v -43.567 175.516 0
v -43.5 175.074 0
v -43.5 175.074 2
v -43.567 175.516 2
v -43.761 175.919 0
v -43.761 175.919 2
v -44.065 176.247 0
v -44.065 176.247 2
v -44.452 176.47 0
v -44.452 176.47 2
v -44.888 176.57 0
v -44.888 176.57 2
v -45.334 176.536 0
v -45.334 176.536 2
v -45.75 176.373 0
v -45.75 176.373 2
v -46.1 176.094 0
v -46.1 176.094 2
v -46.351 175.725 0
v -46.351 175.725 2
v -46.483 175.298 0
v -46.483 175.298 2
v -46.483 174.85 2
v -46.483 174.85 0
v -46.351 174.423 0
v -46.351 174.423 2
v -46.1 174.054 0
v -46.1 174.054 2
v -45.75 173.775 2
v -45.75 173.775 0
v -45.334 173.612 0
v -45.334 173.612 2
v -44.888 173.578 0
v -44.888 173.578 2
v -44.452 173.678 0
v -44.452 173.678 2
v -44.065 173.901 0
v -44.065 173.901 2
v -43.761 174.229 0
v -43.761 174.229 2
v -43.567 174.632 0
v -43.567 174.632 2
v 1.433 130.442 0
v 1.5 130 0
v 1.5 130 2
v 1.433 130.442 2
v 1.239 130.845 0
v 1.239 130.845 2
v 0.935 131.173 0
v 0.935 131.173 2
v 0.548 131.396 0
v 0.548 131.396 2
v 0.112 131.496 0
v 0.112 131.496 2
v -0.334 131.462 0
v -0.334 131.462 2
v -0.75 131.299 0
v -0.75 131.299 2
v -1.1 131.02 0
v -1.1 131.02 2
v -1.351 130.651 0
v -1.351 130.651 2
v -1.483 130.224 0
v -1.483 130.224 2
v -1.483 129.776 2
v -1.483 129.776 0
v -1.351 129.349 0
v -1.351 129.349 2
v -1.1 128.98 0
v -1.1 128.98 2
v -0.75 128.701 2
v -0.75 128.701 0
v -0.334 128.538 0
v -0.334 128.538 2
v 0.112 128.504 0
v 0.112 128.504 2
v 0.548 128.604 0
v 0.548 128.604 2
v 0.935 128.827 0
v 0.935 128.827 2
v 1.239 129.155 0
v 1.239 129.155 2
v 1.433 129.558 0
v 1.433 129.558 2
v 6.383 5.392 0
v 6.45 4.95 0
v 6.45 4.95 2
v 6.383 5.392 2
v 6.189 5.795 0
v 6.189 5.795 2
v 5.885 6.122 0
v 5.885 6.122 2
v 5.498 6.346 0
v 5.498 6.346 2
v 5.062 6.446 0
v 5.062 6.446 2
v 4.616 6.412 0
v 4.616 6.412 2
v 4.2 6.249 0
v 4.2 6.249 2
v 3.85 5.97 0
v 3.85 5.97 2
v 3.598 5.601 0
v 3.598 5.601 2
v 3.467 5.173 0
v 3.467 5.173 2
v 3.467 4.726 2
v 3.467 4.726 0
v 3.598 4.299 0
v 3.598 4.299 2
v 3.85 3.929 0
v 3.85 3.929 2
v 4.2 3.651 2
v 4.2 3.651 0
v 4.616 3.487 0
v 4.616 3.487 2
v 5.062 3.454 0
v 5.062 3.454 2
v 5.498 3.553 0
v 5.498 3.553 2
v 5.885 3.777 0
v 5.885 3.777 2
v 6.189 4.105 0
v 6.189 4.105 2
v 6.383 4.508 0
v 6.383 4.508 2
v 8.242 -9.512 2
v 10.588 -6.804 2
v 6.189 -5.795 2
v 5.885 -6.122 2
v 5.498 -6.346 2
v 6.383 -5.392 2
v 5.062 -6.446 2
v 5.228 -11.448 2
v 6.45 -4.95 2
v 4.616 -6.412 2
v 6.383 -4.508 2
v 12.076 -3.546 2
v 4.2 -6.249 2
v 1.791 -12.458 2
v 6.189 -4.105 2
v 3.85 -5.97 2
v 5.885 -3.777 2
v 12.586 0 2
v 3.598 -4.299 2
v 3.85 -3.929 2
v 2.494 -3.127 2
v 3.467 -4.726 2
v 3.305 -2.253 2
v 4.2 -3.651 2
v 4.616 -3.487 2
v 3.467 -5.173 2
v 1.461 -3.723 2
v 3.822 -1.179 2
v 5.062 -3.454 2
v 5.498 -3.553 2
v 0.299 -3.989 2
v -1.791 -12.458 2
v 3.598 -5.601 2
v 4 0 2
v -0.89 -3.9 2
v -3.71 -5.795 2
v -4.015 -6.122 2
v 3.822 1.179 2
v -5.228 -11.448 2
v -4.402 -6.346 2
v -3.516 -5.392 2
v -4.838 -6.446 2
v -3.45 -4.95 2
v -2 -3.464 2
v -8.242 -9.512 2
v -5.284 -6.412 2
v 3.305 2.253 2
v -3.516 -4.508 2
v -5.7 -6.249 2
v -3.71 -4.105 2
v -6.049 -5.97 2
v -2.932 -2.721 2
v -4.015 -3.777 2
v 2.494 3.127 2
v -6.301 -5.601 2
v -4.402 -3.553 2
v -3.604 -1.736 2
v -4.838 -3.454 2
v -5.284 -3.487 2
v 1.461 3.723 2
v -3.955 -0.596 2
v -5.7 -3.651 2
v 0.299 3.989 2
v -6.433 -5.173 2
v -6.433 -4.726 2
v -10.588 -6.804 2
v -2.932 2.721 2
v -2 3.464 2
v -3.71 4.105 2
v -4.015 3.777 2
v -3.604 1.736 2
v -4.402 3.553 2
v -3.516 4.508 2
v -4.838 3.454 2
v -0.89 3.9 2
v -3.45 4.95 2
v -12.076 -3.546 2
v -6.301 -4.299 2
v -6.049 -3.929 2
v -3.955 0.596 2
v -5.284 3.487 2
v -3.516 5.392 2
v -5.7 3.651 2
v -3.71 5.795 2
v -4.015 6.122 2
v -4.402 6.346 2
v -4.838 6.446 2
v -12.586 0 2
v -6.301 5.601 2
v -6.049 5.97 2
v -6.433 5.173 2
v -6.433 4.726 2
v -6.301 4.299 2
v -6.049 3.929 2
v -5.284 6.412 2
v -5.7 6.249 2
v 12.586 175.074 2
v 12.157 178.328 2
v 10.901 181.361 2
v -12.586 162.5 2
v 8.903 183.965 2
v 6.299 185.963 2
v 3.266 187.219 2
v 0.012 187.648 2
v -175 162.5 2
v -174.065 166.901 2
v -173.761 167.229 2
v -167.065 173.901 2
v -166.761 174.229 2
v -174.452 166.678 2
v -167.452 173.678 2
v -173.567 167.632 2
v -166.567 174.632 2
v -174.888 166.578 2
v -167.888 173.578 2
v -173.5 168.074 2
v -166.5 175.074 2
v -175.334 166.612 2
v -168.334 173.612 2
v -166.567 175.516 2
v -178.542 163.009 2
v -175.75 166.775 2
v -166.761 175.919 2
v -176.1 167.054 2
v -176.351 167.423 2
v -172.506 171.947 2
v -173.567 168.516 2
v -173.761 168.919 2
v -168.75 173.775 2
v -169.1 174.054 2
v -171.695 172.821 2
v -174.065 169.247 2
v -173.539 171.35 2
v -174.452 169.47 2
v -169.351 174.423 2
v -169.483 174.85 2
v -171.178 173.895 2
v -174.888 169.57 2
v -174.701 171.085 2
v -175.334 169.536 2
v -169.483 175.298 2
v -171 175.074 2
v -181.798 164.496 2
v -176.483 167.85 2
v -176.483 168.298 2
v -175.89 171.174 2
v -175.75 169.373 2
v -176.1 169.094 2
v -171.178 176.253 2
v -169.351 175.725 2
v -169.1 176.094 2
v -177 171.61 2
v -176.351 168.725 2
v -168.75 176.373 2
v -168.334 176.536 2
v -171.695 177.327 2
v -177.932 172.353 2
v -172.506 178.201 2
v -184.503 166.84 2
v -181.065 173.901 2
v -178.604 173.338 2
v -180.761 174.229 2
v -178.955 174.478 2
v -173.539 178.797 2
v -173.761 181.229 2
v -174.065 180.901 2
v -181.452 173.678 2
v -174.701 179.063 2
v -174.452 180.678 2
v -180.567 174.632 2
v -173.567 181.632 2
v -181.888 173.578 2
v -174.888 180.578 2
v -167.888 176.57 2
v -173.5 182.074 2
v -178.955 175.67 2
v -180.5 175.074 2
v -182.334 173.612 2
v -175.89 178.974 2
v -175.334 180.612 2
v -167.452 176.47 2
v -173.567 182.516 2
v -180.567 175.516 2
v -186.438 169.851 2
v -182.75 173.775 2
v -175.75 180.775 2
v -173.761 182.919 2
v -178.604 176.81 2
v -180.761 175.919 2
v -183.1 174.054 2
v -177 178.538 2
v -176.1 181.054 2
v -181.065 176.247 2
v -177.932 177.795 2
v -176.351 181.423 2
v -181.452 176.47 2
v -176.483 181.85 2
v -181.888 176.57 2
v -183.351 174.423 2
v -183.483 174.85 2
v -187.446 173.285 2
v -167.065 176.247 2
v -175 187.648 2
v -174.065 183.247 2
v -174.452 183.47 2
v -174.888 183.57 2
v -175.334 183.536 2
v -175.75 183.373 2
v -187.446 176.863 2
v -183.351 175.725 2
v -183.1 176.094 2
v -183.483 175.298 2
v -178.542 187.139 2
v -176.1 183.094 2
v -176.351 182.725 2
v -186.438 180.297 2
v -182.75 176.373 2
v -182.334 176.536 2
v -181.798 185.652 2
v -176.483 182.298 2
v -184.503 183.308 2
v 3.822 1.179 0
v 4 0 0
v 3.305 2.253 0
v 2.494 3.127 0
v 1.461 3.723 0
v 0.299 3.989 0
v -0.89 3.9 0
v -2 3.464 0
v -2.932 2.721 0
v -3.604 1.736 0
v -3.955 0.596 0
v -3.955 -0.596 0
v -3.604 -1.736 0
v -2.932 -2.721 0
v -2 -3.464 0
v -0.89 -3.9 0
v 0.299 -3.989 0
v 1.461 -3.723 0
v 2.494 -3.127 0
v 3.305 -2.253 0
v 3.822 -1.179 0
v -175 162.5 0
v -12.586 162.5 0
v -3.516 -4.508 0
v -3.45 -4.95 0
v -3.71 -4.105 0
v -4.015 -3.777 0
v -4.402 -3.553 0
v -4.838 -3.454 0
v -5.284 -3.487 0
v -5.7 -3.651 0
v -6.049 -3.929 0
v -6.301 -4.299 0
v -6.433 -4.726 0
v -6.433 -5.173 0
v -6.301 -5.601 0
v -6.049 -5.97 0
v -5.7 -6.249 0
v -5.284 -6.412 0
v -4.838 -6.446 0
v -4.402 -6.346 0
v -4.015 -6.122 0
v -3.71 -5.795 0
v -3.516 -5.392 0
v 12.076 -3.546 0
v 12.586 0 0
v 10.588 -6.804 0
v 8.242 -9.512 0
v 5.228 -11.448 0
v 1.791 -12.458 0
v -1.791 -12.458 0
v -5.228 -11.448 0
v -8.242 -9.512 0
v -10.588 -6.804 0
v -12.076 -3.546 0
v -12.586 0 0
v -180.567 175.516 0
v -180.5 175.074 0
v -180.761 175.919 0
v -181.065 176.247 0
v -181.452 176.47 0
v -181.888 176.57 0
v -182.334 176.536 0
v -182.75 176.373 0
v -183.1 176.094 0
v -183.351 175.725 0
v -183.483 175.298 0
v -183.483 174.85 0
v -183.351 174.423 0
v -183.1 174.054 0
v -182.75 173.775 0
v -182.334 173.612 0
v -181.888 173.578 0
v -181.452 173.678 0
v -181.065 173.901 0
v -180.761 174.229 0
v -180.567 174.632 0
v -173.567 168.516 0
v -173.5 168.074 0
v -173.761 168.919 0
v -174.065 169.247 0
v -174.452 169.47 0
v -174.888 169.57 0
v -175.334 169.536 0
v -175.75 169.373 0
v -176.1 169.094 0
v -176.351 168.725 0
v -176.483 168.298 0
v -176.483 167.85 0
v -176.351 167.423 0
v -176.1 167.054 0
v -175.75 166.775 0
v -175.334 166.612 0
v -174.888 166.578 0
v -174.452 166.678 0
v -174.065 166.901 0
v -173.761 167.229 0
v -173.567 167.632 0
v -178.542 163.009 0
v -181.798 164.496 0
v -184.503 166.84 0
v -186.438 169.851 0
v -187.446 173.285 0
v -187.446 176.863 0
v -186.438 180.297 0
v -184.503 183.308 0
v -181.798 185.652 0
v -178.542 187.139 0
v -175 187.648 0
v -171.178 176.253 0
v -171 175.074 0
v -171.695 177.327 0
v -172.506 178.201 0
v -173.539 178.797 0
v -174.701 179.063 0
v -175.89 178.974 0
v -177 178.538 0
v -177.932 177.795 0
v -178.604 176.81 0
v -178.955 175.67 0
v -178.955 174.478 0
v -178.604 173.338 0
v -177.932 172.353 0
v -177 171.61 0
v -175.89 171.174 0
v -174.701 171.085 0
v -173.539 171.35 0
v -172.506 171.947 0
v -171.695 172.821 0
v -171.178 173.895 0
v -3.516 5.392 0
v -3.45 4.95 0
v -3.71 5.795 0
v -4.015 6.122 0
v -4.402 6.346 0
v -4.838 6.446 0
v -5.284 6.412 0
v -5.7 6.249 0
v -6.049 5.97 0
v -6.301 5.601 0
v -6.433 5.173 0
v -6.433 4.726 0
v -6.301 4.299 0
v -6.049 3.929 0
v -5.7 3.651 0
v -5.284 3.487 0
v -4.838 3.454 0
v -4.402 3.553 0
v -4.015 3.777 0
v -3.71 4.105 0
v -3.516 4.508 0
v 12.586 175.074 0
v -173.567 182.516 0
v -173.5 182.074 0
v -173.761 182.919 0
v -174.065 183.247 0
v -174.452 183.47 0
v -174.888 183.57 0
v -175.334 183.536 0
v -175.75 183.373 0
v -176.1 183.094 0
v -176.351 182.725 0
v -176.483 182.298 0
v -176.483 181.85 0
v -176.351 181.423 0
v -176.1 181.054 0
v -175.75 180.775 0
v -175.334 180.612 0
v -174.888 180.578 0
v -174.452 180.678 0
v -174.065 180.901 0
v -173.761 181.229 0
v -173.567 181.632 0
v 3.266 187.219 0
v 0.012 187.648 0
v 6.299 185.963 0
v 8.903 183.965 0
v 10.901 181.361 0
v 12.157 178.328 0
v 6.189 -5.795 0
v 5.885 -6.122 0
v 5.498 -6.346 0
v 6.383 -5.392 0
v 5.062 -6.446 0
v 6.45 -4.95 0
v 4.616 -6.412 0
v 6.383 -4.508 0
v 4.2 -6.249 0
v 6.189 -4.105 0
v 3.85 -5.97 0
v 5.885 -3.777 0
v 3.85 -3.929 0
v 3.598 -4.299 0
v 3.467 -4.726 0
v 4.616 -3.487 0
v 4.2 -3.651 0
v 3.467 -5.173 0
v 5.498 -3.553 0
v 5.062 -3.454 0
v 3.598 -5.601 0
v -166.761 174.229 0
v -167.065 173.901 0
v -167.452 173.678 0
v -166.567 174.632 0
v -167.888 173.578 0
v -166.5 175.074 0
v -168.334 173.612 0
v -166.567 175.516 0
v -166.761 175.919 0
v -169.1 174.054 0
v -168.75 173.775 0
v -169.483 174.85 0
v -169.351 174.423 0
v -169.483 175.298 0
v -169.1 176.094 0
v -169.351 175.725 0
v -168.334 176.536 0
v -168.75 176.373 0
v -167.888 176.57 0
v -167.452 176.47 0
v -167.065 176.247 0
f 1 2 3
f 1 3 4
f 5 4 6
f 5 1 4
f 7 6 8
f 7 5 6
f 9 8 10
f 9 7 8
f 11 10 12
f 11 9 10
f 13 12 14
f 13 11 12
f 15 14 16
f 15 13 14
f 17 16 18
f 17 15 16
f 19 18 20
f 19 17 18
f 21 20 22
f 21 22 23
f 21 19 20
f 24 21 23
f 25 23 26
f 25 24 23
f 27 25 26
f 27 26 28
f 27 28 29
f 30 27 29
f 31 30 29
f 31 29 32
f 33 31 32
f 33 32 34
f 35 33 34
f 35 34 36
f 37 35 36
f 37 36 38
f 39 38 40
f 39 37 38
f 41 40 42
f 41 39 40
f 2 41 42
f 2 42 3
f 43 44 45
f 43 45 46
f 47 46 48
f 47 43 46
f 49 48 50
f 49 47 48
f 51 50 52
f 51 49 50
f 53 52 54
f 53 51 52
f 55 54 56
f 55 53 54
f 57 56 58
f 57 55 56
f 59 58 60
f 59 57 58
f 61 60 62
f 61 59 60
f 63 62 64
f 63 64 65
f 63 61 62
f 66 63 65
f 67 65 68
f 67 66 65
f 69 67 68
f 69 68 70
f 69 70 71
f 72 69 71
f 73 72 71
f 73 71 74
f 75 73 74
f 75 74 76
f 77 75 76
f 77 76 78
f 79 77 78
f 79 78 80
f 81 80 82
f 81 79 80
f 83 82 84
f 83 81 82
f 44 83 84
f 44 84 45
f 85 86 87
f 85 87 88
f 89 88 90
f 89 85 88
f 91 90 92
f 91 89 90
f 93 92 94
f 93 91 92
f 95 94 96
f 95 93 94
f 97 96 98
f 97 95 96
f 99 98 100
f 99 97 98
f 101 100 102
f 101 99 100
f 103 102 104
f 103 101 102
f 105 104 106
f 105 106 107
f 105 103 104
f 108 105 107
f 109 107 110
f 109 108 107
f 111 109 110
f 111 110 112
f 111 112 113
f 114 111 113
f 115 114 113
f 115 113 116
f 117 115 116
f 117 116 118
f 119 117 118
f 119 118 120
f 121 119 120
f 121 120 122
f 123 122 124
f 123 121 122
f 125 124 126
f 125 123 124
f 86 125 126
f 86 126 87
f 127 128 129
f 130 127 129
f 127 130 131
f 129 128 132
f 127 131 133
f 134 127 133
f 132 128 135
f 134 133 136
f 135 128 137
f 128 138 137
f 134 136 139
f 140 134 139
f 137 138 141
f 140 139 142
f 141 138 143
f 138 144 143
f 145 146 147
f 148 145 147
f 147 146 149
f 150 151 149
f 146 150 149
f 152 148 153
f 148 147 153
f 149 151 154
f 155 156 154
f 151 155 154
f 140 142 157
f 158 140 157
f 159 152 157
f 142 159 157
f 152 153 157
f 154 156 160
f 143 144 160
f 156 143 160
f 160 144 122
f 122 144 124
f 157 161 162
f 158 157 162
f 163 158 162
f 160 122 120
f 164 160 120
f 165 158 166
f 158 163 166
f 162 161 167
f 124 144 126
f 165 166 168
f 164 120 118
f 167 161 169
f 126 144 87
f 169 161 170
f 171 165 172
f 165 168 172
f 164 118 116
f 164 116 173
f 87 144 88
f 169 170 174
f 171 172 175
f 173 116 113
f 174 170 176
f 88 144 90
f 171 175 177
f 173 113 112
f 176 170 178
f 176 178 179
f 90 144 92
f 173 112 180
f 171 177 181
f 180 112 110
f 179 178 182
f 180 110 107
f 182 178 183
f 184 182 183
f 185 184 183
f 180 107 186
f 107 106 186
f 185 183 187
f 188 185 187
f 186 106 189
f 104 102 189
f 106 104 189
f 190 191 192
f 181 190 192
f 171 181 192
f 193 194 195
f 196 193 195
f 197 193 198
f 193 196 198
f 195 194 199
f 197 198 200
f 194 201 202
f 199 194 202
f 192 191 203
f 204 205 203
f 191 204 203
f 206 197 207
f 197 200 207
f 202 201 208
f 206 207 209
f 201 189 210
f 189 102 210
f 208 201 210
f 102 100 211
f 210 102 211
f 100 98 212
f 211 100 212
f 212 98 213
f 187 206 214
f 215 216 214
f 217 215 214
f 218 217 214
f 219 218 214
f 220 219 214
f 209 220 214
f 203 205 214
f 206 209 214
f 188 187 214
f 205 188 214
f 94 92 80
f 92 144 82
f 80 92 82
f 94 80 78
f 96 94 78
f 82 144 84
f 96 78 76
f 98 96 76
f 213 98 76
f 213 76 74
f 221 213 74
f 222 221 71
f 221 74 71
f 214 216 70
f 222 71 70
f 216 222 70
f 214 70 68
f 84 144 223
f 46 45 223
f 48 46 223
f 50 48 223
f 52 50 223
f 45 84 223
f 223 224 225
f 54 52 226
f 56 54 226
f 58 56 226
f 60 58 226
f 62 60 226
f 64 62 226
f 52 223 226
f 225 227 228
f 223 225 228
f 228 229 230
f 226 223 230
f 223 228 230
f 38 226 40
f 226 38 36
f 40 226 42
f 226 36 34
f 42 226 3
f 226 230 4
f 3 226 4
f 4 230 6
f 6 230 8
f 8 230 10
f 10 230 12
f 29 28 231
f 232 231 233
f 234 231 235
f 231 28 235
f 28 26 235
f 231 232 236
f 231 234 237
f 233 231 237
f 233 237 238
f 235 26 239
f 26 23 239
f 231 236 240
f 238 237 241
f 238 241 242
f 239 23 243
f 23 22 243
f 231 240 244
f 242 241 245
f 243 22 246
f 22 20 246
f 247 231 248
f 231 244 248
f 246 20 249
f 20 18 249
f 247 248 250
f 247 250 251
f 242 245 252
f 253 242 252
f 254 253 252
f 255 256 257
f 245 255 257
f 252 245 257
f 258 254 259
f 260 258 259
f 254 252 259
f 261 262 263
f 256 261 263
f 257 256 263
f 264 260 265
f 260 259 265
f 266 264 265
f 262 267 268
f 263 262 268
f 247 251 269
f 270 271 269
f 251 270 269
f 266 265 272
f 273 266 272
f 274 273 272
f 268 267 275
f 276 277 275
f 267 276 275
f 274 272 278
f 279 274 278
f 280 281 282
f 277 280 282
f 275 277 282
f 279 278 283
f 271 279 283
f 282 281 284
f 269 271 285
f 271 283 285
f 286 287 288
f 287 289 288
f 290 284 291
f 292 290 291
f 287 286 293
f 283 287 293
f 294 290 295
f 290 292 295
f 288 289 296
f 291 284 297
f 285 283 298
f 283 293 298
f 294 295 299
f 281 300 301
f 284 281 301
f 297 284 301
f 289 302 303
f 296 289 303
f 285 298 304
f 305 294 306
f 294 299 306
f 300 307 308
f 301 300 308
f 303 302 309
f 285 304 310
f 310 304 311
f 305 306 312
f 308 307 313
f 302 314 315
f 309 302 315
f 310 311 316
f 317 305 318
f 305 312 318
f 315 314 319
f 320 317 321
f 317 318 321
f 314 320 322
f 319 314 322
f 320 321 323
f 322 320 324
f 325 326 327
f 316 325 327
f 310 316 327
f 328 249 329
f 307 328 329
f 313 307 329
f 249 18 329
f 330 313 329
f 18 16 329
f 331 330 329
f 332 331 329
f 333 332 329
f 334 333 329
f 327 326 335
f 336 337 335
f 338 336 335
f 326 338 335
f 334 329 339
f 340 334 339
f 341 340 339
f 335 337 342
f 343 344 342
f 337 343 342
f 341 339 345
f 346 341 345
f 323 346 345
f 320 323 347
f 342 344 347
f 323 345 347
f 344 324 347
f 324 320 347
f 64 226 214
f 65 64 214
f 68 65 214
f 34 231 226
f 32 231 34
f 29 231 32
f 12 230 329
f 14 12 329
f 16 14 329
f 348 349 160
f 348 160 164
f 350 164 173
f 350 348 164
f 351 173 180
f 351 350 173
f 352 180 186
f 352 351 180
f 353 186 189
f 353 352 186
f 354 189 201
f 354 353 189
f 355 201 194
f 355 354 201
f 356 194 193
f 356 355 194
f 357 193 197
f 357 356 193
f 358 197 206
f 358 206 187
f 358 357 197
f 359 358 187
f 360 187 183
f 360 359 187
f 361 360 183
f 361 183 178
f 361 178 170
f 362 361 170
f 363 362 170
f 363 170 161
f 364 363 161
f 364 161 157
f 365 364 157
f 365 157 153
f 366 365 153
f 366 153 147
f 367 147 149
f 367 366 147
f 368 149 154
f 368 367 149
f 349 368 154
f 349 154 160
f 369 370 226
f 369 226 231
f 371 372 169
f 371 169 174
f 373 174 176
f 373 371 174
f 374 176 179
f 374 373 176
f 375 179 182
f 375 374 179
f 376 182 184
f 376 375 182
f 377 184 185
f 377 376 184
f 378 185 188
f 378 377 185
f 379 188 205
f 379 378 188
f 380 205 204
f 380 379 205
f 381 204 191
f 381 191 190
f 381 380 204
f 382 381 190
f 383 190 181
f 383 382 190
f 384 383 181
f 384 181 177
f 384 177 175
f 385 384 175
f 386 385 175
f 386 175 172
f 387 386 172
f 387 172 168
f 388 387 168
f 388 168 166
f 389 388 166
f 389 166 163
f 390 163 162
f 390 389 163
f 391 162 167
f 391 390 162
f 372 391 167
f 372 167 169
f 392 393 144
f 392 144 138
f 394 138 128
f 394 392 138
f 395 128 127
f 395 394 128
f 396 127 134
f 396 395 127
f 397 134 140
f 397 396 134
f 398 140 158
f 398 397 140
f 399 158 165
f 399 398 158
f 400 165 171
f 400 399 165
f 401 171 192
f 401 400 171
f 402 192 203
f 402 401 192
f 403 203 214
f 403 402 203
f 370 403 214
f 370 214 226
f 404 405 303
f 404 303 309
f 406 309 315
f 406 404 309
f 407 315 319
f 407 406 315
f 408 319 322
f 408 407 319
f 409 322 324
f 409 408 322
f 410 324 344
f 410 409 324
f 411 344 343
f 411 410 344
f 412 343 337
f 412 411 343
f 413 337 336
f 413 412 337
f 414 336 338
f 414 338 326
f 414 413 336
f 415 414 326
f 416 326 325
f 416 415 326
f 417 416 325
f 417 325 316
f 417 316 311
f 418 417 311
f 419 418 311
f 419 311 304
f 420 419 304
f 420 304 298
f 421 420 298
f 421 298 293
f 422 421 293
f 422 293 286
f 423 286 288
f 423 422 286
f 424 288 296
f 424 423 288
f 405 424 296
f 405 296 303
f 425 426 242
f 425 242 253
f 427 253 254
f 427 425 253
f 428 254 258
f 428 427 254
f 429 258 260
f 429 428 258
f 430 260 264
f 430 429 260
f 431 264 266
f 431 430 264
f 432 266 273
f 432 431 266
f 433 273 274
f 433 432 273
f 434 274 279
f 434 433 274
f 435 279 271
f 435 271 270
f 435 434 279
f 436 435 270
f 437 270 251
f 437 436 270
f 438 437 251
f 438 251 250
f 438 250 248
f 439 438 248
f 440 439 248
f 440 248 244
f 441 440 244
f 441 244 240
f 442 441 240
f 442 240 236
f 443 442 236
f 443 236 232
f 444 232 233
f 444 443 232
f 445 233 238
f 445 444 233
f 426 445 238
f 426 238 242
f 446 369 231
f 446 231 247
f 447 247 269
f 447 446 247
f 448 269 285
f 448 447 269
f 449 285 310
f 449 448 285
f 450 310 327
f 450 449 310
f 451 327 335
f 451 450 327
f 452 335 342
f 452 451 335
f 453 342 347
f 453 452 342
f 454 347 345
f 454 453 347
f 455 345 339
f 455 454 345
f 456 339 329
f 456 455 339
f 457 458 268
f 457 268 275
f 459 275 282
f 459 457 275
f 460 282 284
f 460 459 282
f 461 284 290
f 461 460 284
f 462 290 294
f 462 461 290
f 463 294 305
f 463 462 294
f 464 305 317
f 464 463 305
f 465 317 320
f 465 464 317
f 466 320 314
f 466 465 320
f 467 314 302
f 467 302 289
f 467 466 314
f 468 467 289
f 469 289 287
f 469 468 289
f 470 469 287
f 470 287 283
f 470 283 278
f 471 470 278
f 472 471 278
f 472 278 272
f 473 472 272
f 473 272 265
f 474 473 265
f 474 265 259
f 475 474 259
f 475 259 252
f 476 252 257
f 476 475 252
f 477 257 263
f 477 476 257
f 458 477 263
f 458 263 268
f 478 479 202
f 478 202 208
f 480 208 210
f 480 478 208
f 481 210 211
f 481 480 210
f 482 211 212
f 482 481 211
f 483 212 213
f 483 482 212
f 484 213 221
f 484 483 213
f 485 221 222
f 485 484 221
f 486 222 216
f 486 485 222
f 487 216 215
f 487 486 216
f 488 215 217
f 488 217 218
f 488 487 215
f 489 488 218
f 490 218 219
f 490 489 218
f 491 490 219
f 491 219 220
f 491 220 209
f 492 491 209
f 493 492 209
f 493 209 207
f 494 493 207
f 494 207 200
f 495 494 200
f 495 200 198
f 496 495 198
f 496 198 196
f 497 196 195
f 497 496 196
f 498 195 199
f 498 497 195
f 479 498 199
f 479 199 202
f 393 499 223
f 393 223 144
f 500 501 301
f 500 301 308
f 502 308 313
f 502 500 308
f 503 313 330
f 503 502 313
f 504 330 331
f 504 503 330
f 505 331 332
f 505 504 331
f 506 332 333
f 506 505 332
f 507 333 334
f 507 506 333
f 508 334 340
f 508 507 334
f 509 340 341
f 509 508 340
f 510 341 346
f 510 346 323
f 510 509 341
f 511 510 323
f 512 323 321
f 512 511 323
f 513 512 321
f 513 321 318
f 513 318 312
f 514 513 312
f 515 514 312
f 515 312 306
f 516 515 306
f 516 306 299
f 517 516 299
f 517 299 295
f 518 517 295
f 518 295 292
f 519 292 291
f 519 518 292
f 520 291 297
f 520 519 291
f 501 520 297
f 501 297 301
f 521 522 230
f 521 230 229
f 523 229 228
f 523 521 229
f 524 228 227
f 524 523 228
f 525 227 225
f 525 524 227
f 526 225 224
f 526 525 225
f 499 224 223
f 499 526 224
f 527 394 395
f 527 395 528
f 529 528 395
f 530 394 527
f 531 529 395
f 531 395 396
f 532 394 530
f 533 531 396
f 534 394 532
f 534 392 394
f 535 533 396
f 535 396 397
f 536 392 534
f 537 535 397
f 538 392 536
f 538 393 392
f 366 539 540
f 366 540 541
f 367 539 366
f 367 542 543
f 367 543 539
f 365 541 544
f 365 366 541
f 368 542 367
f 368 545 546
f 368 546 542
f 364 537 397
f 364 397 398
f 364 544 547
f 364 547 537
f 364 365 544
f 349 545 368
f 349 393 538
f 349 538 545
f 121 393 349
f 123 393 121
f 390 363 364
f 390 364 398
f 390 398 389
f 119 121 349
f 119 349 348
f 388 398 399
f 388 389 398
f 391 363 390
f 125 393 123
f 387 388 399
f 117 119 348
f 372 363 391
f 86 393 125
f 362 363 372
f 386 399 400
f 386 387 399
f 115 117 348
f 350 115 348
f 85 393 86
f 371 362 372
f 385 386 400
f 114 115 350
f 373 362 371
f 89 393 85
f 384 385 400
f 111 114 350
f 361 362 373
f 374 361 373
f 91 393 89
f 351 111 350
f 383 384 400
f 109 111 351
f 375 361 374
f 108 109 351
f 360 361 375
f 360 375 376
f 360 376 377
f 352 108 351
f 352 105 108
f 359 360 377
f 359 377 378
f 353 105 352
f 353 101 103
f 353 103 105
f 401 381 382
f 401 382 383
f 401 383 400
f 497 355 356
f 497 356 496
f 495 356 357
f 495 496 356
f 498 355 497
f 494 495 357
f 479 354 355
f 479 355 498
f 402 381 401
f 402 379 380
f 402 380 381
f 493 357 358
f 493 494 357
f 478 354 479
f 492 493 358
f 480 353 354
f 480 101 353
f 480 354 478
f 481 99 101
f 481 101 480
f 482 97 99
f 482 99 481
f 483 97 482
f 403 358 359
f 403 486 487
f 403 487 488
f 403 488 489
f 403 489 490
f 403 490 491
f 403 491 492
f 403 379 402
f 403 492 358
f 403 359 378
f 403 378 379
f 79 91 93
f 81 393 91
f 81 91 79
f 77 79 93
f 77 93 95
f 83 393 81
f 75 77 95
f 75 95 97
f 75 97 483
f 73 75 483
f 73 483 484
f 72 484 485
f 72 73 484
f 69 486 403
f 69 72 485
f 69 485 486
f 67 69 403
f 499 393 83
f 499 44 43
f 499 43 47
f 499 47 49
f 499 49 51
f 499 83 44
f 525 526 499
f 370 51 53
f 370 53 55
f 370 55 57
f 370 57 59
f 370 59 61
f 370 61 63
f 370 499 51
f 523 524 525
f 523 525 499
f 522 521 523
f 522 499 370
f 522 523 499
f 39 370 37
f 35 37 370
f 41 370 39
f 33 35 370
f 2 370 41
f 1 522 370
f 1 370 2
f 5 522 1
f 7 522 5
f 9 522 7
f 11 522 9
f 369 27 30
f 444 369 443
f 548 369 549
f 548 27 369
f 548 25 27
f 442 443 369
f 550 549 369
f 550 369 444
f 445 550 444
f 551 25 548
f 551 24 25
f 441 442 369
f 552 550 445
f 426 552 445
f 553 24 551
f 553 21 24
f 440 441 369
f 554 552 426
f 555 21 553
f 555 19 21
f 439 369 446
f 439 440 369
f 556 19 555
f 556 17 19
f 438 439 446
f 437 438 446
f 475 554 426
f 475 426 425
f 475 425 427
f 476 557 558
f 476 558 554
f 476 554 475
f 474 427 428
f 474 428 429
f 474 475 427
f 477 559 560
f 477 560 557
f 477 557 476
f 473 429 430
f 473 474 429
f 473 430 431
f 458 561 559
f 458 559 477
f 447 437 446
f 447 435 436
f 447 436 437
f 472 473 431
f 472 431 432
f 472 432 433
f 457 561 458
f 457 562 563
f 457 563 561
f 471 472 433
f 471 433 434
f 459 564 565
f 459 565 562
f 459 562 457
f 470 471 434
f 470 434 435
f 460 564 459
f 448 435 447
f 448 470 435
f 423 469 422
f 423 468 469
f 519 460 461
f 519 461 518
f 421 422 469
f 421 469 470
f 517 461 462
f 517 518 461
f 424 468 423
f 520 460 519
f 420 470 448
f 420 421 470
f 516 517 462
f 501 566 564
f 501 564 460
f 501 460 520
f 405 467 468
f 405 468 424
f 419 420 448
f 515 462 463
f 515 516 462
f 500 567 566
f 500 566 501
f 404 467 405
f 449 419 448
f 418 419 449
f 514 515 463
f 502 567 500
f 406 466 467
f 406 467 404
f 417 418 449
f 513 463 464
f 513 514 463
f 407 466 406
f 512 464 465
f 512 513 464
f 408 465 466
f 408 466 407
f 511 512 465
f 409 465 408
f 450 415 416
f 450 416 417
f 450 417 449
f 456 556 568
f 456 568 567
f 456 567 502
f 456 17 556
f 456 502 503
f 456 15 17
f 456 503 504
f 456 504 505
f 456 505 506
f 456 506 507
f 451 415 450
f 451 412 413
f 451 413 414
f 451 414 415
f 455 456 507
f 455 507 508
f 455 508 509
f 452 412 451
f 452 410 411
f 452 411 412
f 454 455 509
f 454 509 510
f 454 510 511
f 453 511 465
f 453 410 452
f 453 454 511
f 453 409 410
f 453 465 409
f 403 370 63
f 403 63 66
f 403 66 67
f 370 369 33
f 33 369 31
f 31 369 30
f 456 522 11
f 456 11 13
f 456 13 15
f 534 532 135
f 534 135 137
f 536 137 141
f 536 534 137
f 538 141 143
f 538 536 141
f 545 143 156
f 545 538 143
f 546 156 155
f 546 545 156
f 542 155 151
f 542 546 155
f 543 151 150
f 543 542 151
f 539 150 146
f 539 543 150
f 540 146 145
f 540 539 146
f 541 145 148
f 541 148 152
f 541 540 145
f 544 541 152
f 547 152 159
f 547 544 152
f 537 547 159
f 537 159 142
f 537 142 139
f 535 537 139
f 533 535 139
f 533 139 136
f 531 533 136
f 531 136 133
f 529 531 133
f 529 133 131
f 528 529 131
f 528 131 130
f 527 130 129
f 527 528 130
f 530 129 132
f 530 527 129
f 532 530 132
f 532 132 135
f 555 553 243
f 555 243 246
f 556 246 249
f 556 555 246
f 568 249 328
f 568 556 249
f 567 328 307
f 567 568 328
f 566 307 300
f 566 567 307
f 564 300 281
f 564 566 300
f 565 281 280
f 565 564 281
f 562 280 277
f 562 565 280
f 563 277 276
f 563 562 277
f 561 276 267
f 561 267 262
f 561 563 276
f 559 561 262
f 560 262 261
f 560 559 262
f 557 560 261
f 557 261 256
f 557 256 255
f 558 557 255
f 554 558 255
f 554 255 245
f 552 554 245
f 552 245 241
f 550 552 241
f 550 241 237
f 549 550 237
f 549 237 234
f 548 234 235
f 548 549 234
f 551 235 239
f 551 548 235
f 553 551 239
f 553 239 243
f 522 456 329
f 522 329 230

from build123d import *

# Parameters (mm, degrees)
SKETCH_1_R      = 4
SKETCH_1_R_2    = 1.5
EXTRUDE_2_DEPTH = 2


with BuildPart() as part:
    # 草图1 → 凸台-拉伸2 (new body)
    with BuildSketch(Plane.XY):
        with BuildLine():
            Line((-12.585683816, 0), (-12.585683816, 162.5))
            Line((-12.585683816, 162.5), (-175, 162.5))
            ThreePointArc((-175, 162.5), (-187.573970324, 175.073970324), (-175, 187.647940648))
            Line((-175, 187.647940648), (0.011713493, 187.647940648))
            ThreePointArc((0.011713493, 187.647940648), (8.902853175, 183.965110006), (12.585683816, 175.073970324))
            Line((12.585683816, 175.073970324), (12.585683816, 0))
            ThreePointArc((12.585683816, 0), (0, -12.585683816), (-12.585683816, 0))
        make_face()
        Circle(SKETCH_1_R, mode=Mode.SUBTRACT)
        with Locations((-175, 175.073970324)):
            Circle(SKETCH_1_R, mode=Mode.SUBTRACT)
        with Locations((-175, 182.073970324)):
            Circle(SKETCH_1_R_2, mode=Mode.SUBTRACT)
        with Locations((-168, 175.073970324)):
            Circle(SKETCH_1_R_2, mode=Mode.SUBTRACT)
        with Locations((-175, 168.073970324)):
            Circle(SKETCH_1_R_2, mode=Mode.SUBTRACT)
        with Locations((-182, 175.073970324)):
            Circle(SKETCH_1_R_2, mode=Mode.SUBTRACT)
        with Locations((0, 130)):
            Circle(SKETCH_1_R_2, mode=Mode.SUBTRACT)
        with Locations((-45, 175.073970324)):
            Circle(SKETCH_1_R_2, mode=Mode.SUBTRACT)
        with Locations((4.949747468, 4.949747468)):
            Circle(SKETCH_1_R_2, mode=Mode.SUBTRACT)
        with Locations((4.949747468, -4.949747468)):
            Circle(SKETCH_1_R_2, mode=Mode.SUBTRACT)
        with Locations((-4.949747468, -4.949747468)):
            Circle(SKETCH_1_R_2, mode=Mode.SUBTRACT)
        with Locations((-4.949747468, 4.949747468)):
            Circle(SKETCH_1_R_2, mode=Mode.SUBTRACT)
    extrude(amount=EXTRUDE_2_DEPTH)


solid = part.part
